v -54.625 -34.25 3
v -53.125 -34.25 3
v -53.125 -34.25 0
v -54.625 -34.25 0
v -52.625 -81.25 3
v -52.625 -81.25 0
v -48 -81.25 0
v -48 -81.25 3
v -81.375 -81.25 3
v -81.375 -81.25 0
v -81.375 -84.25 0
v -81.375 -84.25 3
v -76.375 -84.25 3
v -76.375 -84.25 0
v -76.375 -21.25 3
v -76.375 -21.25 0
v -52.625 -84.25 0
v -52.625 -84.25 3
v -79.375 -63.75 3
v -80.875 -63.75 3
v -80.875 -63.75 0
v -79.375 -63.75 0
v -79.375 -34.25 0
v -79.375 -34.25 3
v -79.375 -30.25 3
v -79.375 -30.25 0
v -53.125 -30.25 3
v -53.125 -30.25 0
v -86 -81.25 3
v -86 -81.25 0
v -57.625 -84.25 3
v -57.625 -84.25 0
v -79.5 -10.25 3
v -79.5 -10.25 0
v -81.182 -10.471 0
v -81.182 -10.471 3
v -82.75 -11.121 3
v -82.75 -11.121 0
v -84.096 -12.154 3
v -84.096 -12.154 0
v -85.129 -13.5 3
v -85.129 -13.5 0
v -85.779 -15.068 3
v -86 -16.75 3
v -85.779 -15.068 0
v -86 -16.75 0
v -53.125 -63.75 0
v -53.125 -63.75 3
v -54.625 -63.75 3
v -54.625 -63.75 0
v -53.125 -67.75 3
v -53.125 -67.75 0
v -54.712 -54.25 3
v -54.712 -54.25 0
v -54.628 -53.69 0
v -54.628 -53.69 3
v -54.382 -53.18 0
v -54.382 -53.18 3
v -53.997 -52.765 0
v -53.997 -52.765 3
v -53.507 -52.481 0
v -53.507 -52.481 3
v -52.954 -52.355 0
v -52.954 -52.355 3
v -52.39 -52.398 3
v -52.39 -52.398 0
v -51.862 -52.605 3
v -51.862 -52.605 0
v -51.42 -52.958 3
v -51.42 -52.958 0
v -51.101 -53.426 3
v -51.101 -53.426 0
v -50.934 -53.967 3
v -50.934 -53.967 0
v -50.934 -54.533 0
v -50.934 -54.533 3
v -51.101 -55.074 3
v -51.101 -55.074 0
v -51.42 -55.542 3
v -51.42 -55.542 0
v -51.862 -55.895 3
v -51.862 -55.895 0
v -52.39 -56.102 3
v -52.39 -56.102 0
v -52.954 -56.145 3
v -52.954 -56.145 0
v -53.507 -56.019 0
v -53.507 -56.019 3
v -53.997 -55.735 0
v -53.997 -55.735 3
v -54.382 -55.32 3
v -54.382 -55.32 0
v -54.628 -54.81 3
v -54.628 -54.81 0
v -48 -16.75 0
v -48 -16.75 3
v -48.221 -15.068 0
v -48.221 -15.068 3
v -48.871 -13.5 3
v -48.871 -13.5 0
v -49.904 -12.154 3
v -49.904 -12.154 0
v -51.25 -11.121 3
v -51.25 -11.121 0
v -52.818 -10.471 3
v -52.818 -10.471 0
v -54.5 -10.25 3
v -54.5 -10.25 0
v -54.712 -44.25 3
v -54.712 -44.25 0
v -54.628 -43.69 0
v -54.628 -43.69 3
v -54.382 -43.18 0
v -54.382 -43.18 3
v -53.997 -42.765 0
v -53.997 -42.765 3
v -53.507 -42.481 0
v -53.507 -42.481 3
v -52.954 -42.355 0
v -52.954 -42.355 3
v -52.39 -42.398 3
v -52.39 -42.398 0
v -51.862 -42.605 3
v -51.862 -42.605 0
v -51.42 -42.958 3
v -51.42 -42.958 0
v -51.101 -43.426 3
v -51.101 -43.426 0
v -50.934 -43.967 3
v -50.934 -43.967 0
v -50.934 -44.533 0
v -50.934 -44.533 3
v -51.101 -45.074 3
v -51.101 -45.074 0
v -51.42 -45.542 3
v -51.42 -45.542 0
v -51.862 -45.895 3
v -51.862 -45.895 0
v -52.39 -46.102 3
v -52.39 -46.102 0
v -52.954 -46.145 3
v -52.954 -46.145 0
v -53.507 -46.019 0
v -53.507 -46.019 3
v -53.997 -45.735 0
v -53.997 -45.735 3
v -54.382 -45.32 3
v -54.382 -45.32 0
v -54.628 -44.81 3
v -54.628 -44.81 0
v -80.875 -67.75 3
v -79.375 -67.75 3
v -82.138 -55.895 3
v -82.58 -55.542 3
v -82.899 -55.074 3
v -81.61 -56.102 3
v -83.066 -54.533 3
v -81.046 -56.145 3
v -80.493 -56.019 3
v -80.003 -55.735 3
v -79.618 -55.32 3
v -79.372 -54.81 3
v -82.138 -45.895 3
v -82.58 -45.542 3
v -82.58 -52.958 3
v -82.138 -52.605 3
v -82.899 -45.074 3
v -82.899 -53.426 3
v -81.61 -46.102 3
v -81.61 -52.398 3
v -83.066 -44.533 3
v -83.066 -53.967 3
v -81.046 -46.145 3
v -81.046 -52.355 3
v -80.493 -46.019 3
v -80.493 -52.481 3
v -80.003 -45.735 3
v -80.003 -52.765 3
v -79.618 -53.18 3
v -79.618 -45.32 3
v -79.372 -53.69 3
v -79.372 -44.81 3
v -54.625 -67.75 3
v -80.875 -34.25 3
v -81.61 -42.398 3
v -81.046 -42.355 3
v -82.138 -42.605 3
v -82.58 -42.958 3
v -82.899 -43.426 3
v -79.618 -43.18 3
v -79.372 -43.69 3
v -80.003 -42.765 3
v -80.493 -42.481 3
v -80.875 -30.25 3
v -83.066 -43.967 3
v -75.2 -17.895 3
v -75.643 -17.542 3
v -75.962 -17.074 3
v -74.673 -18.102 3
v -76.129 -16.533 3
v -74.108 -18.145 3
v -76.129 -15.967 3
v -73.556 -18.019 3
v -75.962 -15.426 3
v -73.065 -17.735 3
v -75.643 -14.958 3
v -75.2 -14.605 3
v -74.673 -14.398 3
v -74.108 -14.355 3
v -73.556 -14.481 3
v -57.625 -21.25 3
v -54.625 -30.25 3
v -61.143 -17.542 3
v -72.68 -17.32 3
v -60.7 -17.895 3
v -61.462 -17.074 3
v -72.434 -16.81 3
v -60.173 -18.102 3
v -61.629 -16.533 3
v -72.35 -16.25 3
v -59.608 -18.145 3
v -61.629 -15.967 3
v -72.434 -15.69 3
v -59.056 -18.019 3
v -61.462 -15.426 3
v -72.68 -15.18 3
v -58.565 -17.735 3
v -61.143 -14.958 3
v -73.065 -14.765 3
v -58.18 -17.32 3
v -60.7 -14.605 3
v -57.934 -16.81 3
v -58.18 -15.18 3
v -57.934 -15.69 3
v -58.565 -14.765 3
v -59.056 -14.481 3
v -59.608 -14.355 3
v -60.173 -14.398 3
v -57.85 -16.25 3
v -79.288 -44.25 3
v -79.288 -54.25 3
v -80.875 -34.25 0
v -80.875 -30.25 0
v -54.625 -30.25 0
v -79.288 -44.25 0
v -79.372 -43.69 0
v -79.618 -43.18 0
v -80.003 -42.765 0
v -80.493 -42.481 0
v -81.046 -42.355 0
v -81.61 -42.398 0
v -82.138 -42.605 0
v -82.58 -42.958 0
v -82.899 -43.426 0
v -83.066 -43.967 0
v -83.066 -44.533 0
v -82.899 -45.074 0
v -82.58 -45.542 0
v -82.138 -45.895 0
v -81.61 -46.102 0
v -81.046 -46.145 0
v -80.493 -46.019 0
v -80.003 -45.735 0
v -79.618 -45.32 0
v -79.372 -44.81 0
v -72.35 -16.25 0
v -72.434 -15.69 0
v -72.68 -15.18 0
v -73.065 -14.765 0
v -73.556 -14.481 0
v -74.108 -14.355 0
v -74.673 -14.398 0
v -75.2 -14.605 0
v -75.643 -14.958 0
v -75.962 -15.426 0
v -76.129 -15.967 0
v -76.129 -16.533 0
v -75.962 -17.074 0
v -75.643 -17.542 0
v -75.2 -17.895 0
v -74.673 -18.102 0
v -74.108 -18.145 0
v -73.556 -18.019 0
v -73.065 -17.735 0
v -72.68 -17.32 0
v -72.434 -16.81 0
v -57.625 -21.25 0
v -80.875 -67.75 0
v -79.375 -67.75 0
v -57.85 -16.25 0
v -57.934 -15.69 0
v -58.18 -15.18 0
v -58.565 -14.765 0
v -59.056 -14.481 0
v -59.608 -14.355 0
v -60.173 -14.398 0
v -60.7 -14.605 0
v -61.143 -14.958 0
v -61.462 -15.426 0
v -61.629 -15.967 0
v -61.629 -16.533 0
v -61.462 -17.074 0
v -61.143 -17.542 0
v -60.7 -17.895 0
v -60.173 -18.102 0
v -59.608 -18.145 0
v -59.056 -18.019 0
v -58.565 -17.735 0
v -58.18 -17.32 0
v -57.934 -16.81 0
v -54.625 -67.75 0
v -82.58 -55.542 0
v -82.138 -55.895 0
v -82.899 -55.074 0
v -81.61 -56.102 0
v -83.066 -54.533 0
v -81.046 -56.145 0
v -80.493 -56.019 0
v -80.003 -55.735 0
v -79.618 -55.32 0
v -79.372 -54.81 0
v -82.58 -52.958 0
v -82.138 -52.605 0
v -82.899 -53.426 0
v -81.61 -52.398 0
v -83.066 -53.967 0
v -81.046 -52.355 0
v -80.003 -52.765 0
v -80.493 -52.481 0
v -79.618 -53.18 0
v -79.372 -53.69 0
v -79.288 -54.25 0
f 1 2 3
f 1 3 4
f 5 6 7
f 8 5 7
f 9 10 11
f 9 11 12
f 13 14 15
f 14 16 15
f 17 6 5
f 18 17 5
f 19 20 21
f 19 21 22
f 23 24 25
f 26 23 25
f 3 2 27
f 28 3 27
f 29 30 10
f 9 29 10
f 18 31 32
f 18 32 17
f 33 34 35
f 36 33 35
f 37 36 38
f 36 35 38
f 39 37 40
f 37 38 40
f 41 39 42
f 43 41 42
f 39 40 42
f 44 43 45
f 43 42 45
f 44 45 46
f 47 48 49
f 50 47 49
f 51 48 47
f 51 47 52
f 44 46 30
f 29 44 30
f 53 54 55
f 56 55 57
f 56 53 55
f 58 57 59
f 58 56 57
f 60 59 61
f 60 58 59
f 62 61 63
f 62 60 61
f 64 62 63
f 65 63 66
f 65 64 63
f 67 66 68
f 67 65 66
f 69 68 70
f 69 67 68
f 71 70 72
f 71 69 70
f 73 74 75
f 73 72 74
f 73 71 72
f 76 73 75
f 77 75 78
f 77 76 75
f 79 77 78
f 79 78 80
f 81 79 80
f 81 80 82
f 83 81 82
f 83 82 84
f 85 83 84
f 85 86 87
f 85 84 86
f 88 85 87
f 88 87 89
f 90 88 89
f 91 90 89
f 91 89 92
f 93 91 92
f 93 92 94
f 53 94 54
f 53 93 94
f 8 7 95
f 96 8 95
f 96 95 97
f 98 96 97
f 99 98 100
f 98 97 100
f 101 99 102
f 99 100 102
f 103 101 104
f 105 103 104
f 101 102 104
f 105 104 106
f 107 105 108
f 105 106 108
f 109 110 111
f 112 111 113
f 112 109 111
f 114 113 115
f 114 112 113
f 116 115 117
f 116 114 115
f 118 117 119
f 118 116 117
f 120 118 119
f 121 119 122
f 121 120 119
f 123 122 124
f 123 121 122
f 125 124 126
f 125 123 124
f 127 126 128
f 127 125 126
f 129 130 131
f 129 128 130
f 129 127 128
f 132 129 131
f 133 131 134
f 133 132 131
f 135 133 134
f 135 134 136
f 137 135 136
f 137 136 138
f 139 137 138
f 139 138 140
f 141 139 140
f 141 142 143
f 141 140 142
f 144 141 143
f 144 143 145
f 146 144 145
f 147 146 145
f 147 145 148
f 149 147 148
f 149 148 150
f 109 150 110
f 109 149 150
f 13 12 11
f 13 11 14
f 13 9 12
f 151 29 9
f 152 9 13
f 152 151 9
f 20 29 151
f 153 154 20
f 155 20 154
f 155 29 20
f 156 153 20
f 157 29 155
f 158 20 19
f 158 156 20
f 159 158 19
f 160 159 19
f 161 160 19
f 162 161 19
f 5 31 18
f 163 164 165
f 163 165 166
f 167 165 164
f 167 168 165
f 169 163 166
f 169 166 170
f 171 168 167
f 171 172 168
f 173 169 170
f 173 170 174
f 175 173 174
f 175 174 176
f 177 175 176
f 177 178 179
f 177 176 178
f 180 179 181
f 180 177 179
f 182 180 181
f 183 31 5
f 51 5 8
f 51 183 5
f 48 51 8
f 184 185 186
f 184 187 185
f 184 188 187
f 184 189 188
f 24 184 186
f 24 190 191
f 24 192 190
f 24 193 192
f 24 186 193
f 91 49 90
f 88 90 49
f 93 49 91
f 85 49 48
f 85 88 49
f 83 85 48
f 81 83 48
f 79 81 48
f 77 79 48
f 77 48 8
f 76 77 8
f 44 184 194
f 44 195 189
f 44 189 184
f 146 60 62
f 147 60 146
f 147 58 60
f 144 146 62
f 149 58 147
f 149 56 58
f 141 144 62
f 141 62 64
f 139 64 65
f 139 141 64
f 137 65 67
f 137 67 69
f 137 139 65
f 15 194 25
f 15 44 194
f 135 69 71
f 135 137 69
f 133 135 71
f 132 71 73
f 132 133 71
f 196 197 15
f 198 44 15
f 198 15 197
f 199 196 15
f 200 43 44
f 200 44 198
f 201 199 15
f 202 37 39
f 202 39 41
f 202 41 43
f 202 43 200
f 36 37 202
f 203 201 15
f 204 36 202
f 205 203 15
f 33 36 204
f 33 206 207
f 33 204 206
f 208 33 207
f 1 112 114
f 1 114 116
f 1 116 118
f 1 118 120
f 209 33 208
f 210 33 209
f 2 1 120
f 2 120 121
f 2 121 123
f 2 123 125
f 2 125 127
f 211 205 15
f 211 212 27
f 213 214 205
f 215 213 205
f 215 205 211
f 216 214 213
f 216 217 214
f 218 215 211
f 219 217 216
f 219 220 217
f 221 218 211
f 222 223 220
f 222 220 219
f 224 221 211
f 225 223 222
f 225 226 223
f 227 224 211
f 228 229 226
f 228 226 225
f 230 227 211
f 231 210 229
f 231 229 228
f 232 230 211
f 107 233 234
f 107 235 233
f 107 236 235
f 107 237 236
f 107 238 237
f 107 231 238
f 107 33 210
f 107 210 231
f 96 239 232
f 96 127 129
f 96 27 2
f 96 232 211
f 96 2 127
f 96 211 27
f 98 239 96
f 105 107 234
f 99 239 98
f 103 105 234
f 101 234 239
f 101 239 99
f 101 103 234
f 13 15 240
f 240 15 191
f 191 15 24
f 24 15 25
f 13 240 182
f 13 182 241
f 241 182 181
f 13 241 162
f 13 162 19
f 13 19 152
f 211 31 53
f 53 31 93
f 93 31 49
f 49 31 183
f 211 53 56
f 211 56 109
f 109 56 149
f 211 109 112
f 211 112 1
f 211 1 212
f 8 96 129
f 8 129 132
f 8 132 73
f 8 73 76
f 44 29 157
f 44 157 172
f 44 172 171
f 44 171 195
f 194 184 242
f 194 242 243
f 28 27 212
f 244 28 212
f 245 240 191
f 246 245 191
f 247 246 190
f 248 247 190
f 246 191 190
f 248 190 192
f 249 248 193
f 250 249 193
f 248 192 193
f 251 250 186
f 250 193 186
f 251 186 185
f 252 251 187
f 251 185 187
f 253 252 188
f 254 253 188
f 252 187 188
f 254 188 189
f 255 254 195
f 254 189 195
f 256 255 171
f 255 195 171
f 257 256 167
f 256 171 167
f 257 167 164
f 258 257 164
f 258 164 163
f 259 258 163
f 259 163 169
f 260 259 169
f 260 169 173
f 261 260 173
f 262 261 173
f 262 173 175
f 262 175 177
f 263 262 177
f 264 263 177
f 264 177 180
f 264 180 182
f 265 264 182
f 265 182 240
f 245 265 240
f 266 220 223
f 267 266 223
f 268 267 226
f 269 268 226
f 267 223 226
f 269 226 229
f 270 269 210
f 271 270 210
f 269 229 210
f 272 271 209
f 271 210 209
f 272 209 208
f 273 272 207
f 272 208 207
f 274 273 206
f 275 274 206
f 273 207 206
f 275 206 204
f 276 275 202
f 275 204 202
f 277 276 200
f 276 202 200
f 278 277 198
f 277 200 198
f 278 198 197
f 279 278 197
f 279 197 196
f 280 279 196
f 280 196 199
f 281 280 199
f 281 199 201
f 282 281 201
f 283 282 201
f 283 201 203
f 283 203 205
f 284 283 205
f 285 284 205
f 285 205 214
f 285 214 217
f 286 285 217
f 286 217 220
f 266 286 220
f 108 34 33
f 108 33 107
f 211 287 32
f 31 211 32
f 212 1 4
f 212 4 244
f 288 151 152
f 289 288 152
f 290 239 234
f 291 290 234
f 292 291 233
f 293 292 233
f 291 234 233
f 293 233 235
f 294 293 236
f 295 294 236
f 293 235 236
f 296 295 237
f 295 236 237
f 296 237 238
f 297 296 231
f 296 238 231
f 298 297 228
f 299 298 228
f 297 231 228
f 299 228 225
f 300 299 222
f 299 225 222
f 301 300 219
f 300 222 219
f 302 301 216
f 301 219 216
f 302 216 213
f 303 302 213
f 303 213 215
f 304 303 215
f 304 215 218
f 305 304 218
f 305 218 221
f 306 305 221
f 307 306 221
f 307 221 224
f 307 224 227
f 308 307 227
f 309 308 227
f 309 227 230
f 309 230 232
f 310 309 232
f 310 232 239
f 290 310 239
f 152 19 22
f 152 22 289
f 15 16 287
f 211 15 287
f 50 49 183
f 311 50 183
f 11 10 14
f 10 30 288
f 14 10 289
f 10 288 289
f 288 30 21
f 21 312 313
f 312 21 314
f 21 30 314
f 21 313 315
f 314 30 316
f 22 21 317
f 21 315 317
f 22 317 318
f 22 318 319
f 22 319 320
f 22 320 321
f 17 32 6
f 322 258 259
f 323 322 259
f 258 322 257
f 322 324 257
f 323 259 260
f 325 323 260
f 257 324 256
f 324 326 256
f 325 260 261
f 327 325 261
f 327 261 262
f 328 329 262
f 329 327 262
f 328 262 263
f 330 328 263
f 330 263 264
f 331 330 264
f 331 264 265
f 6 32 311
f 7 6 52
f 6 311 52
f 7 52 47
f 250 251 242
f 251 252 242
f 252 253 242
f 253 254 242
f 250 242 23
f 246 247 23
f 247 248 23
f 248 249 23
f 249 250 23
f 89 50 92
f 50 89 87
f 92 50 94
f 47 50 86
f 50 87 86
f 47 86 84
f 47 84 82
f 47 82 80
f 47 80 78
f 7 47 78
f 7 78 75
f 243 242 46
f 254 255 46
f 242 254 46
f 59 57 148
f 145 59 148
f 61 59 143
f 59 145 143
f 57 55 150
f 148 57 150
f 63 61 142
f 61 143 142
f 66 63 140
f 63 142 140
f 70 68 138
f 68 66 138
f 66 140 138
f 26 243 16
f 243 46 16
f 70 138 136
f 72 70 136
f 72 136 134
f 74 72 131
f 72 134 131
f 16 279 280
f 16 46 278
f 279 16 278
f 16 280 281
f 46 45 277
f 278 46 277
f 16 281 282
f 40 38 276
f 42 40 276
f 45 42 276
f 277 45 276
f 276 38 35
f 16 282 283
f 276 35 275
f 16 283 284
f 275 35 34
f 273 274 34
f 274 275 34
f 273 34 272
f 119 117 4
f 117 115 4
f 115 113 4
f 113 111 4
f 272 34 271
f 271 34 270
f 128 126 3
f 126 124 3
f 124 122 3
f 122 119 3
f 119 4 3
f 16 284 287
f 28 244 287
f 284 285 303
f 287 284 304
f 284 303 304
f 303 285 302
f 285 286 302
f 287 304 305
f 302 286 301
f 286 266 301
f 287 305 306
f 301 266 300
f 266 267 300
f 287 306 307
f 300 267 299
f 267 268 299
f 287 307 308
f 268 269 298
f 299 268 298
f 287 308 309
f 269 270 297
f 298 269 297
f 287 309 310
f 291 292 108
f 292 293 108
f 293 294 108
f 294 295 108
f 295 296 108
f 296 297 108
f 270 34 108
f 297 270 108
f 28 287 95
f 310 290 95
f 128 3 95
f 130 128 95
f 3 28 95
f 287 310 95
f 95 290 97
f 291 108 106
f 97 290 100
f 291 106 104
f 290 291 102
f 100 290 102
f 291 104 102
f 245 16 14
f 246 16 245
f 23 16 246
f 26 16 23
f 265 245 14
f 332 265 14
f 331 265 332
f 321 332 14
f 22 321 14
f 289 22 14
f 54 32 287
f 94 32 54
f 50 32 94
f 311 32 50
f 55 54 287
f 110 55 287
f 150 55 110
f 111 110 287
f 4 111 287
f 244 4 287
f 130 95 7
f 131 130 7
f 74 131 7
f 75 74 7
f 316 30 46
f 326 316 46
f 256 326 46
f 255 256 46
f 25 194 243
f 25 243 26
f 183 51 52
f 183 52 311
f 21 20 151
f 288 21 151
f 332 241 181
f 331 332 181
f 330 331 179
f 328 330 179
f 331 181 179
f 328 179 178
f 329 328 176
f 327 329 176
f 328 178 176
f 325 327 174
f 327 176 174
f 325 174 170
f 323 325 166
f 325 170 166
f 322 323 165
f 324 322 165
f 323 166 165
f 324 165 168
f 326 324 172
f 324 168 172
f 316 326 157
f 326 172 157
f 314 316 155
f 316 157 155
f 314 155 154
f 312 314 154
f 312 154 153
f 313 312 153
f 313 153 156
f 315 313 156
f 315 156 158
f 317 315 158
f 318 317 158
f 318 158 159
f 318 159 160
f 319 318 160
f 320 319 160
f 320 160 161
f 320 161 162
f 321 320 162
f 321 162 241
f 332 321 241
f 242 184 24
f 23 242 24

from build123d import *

# Parameters (mm, degrees)
PAD001_DEPTH                  = 3
SKETCH002_W                   = 5
SKETCH002_H                   = 3
PAD002_DEPTH                  = 3
SKETCH006_W                   = 1.5
SKETCH006_H                   = 4
POCKET002_DEPTH               = 169.48223
SKETCH006_MIRRORED004_2_W     = 1.5
SKETCH006_MIRRORED004_2_H     = 4
POCKET002_MIRRORED004_2_DEPTH = 169.48223
SKETCH008_R                   = 1.9
POCKET003_DEPTH               = 3.001
SKETCH013_R                   = 1.9
POCKET007_DEPTH               = 169.48223
SKETCH038_R                   = 1.9
POCKET025_DEPTH               = 169.48223


with BuildPart() as part:
    # Sketch001 → Pad001 (new body)
    with BuildSketch(Plane.XY):
        with BuildLine():
            Line((-19, 32.25), (-19, -32.25))
            Line((-19, -32.25), (-9.375, -32.25))
            Line((-9.375, -32.25), (-9.375, 27.75))
            Line((-9.375, 27.75), (9.375, 27.75))
            Line((9.375, 27.75), (9.375, -32.25))
            Line((9.375, -32.25), (19, -32.25))
            Line((19, -32.25), (19, 32.25))
            ThreePointArc((19, 32.25), (17.096194, 36.846194), (12.5, 38.75))
            Line((-12.5, 38.75), (12.5, 38.75))
            ThreePointArc((-12.5, 38.75), (-17.096194, 36.846194), (-19, 32.25))
        make_face()
    extrude(amount=PAD001_DEPTH)

    # Sketch002 (on DatumPlane) → Pad002 (join)
    with BuildSketch(Plane.XZ.offset(32.25)):
        with Locations((-11.875, 1.5)):
            Rectangle(SKETCH002_W, SKETCH002_H)
        with Locations((11.875, 1.5)):
            Rectangle(SKETCH002_W, SKETCH002_H)
    extrude(amount=PAD002_DEPTH)

    # Sketch006 (on Face14 of Pad002) → Pocket002 (cut, through all)
    with BuildSketch(Plane.XY.offset(3)):
        with Locations((-13.125, 16.75)):
            Rectangle(SKETCH006_W, SKETCH006_H)
    pocket002 = extrude(amount=-POCKET002_DEPTH, mode=Mode.SUBTRACT)

    # Sketch006 Mirrored004 2 → Pocket002 Mirrored004 2 (cut, through all)
    with BuildSketch(Plane(origin=(0, 0, 3), x_dir=(-1, 0, 0), z_dir=(0, 0, -1))):
        with Locations((-13.125, 16.75)):
            Rectangle(SKETCH006_MIRRORED004_2_W, SKETCH006_MIRRORED004_2_H)
    pocket002_mirrored004_2 = extrude(amount=POCKET002_MIRRORED004_2_DEPTH, mode=Mode.SUBTRACT)

    # Mirrored005: Pocket002, Pocket002 Mirrored004 2 across Sketch006 H_Axis
    add(pocket002.mirror(Plane(origin=(0, 0, 3), x_dir=(0, 0, 1), z_dir=(0, 1, 0))), mode=Mode.SUBTRACT)
    add(pocket002_mirrored004_2.mirror(Plane(origin=(0, 0, 3), x_dir=(0, 0, 1), z_dir=(0, 1, 0))), mode=Mode.SUBTRACT)

    # Sketch008 (on Face4 of MultiTransform002) → Pocket003 (cut, through all)
    with BuildSketch(Plane.XY.offset(3)):
        with Locations((-7.25, 32.75)):
            Circle(SKETCH008_R)
        with Locations((7.25, 32.75)):
            Circle(SKETCH008_R)
    extrude(amount=-POCKET003_DEPTH, mode=Mode.SUBTRACT)

    # Sketch013 (on Face4 of Pocket003) → Pocket007 (cut, through all)
    with BuildSketch(Plane.XY.offset(3)):
        with Locations((-14.1875, -5.25)):
            Circle(SKETCH013_R)
    pocket007 = extrude(amount=-POCKET007_DEPTH, mode=Mode.SUBTRACT)

    # Mirrored008: Pocket007 across Sketch013 V_Axis
    add(pocket007.mirror(Plane(origin=(0, 0, 3), x_dir=(0, 0, 1), z_dir=(1, 0, 0))), mode=Mode.SUBTRACT)

    # Sketch038 (on Face4 of Mirrored008) → Pocket025 (cut, through all)
    with BuildSketch(Plane.XY.offset(3)):
        with Locations((-14.1875, 4.75)):
            Circle(SKETCH038_R)
    pocket025 = extrude(amount=-POCKET025_DEPTH, mode=Mode.SUBTRACT)

    # Mirrored021: Pocket025 across Sketch038 V_Axis
    add(pocket025.mirror(Plane(origin=(0, 0, 3), x_dir=(0, 0, 1), z_dir=(1, 0, 0))), mode=Mode.SUBTRACT)


with BuildPart() as part_1:
    # Body001 placement: moved
    add(part.part.moved(Location((-67, -49, 0))))


solid = part_1.part
